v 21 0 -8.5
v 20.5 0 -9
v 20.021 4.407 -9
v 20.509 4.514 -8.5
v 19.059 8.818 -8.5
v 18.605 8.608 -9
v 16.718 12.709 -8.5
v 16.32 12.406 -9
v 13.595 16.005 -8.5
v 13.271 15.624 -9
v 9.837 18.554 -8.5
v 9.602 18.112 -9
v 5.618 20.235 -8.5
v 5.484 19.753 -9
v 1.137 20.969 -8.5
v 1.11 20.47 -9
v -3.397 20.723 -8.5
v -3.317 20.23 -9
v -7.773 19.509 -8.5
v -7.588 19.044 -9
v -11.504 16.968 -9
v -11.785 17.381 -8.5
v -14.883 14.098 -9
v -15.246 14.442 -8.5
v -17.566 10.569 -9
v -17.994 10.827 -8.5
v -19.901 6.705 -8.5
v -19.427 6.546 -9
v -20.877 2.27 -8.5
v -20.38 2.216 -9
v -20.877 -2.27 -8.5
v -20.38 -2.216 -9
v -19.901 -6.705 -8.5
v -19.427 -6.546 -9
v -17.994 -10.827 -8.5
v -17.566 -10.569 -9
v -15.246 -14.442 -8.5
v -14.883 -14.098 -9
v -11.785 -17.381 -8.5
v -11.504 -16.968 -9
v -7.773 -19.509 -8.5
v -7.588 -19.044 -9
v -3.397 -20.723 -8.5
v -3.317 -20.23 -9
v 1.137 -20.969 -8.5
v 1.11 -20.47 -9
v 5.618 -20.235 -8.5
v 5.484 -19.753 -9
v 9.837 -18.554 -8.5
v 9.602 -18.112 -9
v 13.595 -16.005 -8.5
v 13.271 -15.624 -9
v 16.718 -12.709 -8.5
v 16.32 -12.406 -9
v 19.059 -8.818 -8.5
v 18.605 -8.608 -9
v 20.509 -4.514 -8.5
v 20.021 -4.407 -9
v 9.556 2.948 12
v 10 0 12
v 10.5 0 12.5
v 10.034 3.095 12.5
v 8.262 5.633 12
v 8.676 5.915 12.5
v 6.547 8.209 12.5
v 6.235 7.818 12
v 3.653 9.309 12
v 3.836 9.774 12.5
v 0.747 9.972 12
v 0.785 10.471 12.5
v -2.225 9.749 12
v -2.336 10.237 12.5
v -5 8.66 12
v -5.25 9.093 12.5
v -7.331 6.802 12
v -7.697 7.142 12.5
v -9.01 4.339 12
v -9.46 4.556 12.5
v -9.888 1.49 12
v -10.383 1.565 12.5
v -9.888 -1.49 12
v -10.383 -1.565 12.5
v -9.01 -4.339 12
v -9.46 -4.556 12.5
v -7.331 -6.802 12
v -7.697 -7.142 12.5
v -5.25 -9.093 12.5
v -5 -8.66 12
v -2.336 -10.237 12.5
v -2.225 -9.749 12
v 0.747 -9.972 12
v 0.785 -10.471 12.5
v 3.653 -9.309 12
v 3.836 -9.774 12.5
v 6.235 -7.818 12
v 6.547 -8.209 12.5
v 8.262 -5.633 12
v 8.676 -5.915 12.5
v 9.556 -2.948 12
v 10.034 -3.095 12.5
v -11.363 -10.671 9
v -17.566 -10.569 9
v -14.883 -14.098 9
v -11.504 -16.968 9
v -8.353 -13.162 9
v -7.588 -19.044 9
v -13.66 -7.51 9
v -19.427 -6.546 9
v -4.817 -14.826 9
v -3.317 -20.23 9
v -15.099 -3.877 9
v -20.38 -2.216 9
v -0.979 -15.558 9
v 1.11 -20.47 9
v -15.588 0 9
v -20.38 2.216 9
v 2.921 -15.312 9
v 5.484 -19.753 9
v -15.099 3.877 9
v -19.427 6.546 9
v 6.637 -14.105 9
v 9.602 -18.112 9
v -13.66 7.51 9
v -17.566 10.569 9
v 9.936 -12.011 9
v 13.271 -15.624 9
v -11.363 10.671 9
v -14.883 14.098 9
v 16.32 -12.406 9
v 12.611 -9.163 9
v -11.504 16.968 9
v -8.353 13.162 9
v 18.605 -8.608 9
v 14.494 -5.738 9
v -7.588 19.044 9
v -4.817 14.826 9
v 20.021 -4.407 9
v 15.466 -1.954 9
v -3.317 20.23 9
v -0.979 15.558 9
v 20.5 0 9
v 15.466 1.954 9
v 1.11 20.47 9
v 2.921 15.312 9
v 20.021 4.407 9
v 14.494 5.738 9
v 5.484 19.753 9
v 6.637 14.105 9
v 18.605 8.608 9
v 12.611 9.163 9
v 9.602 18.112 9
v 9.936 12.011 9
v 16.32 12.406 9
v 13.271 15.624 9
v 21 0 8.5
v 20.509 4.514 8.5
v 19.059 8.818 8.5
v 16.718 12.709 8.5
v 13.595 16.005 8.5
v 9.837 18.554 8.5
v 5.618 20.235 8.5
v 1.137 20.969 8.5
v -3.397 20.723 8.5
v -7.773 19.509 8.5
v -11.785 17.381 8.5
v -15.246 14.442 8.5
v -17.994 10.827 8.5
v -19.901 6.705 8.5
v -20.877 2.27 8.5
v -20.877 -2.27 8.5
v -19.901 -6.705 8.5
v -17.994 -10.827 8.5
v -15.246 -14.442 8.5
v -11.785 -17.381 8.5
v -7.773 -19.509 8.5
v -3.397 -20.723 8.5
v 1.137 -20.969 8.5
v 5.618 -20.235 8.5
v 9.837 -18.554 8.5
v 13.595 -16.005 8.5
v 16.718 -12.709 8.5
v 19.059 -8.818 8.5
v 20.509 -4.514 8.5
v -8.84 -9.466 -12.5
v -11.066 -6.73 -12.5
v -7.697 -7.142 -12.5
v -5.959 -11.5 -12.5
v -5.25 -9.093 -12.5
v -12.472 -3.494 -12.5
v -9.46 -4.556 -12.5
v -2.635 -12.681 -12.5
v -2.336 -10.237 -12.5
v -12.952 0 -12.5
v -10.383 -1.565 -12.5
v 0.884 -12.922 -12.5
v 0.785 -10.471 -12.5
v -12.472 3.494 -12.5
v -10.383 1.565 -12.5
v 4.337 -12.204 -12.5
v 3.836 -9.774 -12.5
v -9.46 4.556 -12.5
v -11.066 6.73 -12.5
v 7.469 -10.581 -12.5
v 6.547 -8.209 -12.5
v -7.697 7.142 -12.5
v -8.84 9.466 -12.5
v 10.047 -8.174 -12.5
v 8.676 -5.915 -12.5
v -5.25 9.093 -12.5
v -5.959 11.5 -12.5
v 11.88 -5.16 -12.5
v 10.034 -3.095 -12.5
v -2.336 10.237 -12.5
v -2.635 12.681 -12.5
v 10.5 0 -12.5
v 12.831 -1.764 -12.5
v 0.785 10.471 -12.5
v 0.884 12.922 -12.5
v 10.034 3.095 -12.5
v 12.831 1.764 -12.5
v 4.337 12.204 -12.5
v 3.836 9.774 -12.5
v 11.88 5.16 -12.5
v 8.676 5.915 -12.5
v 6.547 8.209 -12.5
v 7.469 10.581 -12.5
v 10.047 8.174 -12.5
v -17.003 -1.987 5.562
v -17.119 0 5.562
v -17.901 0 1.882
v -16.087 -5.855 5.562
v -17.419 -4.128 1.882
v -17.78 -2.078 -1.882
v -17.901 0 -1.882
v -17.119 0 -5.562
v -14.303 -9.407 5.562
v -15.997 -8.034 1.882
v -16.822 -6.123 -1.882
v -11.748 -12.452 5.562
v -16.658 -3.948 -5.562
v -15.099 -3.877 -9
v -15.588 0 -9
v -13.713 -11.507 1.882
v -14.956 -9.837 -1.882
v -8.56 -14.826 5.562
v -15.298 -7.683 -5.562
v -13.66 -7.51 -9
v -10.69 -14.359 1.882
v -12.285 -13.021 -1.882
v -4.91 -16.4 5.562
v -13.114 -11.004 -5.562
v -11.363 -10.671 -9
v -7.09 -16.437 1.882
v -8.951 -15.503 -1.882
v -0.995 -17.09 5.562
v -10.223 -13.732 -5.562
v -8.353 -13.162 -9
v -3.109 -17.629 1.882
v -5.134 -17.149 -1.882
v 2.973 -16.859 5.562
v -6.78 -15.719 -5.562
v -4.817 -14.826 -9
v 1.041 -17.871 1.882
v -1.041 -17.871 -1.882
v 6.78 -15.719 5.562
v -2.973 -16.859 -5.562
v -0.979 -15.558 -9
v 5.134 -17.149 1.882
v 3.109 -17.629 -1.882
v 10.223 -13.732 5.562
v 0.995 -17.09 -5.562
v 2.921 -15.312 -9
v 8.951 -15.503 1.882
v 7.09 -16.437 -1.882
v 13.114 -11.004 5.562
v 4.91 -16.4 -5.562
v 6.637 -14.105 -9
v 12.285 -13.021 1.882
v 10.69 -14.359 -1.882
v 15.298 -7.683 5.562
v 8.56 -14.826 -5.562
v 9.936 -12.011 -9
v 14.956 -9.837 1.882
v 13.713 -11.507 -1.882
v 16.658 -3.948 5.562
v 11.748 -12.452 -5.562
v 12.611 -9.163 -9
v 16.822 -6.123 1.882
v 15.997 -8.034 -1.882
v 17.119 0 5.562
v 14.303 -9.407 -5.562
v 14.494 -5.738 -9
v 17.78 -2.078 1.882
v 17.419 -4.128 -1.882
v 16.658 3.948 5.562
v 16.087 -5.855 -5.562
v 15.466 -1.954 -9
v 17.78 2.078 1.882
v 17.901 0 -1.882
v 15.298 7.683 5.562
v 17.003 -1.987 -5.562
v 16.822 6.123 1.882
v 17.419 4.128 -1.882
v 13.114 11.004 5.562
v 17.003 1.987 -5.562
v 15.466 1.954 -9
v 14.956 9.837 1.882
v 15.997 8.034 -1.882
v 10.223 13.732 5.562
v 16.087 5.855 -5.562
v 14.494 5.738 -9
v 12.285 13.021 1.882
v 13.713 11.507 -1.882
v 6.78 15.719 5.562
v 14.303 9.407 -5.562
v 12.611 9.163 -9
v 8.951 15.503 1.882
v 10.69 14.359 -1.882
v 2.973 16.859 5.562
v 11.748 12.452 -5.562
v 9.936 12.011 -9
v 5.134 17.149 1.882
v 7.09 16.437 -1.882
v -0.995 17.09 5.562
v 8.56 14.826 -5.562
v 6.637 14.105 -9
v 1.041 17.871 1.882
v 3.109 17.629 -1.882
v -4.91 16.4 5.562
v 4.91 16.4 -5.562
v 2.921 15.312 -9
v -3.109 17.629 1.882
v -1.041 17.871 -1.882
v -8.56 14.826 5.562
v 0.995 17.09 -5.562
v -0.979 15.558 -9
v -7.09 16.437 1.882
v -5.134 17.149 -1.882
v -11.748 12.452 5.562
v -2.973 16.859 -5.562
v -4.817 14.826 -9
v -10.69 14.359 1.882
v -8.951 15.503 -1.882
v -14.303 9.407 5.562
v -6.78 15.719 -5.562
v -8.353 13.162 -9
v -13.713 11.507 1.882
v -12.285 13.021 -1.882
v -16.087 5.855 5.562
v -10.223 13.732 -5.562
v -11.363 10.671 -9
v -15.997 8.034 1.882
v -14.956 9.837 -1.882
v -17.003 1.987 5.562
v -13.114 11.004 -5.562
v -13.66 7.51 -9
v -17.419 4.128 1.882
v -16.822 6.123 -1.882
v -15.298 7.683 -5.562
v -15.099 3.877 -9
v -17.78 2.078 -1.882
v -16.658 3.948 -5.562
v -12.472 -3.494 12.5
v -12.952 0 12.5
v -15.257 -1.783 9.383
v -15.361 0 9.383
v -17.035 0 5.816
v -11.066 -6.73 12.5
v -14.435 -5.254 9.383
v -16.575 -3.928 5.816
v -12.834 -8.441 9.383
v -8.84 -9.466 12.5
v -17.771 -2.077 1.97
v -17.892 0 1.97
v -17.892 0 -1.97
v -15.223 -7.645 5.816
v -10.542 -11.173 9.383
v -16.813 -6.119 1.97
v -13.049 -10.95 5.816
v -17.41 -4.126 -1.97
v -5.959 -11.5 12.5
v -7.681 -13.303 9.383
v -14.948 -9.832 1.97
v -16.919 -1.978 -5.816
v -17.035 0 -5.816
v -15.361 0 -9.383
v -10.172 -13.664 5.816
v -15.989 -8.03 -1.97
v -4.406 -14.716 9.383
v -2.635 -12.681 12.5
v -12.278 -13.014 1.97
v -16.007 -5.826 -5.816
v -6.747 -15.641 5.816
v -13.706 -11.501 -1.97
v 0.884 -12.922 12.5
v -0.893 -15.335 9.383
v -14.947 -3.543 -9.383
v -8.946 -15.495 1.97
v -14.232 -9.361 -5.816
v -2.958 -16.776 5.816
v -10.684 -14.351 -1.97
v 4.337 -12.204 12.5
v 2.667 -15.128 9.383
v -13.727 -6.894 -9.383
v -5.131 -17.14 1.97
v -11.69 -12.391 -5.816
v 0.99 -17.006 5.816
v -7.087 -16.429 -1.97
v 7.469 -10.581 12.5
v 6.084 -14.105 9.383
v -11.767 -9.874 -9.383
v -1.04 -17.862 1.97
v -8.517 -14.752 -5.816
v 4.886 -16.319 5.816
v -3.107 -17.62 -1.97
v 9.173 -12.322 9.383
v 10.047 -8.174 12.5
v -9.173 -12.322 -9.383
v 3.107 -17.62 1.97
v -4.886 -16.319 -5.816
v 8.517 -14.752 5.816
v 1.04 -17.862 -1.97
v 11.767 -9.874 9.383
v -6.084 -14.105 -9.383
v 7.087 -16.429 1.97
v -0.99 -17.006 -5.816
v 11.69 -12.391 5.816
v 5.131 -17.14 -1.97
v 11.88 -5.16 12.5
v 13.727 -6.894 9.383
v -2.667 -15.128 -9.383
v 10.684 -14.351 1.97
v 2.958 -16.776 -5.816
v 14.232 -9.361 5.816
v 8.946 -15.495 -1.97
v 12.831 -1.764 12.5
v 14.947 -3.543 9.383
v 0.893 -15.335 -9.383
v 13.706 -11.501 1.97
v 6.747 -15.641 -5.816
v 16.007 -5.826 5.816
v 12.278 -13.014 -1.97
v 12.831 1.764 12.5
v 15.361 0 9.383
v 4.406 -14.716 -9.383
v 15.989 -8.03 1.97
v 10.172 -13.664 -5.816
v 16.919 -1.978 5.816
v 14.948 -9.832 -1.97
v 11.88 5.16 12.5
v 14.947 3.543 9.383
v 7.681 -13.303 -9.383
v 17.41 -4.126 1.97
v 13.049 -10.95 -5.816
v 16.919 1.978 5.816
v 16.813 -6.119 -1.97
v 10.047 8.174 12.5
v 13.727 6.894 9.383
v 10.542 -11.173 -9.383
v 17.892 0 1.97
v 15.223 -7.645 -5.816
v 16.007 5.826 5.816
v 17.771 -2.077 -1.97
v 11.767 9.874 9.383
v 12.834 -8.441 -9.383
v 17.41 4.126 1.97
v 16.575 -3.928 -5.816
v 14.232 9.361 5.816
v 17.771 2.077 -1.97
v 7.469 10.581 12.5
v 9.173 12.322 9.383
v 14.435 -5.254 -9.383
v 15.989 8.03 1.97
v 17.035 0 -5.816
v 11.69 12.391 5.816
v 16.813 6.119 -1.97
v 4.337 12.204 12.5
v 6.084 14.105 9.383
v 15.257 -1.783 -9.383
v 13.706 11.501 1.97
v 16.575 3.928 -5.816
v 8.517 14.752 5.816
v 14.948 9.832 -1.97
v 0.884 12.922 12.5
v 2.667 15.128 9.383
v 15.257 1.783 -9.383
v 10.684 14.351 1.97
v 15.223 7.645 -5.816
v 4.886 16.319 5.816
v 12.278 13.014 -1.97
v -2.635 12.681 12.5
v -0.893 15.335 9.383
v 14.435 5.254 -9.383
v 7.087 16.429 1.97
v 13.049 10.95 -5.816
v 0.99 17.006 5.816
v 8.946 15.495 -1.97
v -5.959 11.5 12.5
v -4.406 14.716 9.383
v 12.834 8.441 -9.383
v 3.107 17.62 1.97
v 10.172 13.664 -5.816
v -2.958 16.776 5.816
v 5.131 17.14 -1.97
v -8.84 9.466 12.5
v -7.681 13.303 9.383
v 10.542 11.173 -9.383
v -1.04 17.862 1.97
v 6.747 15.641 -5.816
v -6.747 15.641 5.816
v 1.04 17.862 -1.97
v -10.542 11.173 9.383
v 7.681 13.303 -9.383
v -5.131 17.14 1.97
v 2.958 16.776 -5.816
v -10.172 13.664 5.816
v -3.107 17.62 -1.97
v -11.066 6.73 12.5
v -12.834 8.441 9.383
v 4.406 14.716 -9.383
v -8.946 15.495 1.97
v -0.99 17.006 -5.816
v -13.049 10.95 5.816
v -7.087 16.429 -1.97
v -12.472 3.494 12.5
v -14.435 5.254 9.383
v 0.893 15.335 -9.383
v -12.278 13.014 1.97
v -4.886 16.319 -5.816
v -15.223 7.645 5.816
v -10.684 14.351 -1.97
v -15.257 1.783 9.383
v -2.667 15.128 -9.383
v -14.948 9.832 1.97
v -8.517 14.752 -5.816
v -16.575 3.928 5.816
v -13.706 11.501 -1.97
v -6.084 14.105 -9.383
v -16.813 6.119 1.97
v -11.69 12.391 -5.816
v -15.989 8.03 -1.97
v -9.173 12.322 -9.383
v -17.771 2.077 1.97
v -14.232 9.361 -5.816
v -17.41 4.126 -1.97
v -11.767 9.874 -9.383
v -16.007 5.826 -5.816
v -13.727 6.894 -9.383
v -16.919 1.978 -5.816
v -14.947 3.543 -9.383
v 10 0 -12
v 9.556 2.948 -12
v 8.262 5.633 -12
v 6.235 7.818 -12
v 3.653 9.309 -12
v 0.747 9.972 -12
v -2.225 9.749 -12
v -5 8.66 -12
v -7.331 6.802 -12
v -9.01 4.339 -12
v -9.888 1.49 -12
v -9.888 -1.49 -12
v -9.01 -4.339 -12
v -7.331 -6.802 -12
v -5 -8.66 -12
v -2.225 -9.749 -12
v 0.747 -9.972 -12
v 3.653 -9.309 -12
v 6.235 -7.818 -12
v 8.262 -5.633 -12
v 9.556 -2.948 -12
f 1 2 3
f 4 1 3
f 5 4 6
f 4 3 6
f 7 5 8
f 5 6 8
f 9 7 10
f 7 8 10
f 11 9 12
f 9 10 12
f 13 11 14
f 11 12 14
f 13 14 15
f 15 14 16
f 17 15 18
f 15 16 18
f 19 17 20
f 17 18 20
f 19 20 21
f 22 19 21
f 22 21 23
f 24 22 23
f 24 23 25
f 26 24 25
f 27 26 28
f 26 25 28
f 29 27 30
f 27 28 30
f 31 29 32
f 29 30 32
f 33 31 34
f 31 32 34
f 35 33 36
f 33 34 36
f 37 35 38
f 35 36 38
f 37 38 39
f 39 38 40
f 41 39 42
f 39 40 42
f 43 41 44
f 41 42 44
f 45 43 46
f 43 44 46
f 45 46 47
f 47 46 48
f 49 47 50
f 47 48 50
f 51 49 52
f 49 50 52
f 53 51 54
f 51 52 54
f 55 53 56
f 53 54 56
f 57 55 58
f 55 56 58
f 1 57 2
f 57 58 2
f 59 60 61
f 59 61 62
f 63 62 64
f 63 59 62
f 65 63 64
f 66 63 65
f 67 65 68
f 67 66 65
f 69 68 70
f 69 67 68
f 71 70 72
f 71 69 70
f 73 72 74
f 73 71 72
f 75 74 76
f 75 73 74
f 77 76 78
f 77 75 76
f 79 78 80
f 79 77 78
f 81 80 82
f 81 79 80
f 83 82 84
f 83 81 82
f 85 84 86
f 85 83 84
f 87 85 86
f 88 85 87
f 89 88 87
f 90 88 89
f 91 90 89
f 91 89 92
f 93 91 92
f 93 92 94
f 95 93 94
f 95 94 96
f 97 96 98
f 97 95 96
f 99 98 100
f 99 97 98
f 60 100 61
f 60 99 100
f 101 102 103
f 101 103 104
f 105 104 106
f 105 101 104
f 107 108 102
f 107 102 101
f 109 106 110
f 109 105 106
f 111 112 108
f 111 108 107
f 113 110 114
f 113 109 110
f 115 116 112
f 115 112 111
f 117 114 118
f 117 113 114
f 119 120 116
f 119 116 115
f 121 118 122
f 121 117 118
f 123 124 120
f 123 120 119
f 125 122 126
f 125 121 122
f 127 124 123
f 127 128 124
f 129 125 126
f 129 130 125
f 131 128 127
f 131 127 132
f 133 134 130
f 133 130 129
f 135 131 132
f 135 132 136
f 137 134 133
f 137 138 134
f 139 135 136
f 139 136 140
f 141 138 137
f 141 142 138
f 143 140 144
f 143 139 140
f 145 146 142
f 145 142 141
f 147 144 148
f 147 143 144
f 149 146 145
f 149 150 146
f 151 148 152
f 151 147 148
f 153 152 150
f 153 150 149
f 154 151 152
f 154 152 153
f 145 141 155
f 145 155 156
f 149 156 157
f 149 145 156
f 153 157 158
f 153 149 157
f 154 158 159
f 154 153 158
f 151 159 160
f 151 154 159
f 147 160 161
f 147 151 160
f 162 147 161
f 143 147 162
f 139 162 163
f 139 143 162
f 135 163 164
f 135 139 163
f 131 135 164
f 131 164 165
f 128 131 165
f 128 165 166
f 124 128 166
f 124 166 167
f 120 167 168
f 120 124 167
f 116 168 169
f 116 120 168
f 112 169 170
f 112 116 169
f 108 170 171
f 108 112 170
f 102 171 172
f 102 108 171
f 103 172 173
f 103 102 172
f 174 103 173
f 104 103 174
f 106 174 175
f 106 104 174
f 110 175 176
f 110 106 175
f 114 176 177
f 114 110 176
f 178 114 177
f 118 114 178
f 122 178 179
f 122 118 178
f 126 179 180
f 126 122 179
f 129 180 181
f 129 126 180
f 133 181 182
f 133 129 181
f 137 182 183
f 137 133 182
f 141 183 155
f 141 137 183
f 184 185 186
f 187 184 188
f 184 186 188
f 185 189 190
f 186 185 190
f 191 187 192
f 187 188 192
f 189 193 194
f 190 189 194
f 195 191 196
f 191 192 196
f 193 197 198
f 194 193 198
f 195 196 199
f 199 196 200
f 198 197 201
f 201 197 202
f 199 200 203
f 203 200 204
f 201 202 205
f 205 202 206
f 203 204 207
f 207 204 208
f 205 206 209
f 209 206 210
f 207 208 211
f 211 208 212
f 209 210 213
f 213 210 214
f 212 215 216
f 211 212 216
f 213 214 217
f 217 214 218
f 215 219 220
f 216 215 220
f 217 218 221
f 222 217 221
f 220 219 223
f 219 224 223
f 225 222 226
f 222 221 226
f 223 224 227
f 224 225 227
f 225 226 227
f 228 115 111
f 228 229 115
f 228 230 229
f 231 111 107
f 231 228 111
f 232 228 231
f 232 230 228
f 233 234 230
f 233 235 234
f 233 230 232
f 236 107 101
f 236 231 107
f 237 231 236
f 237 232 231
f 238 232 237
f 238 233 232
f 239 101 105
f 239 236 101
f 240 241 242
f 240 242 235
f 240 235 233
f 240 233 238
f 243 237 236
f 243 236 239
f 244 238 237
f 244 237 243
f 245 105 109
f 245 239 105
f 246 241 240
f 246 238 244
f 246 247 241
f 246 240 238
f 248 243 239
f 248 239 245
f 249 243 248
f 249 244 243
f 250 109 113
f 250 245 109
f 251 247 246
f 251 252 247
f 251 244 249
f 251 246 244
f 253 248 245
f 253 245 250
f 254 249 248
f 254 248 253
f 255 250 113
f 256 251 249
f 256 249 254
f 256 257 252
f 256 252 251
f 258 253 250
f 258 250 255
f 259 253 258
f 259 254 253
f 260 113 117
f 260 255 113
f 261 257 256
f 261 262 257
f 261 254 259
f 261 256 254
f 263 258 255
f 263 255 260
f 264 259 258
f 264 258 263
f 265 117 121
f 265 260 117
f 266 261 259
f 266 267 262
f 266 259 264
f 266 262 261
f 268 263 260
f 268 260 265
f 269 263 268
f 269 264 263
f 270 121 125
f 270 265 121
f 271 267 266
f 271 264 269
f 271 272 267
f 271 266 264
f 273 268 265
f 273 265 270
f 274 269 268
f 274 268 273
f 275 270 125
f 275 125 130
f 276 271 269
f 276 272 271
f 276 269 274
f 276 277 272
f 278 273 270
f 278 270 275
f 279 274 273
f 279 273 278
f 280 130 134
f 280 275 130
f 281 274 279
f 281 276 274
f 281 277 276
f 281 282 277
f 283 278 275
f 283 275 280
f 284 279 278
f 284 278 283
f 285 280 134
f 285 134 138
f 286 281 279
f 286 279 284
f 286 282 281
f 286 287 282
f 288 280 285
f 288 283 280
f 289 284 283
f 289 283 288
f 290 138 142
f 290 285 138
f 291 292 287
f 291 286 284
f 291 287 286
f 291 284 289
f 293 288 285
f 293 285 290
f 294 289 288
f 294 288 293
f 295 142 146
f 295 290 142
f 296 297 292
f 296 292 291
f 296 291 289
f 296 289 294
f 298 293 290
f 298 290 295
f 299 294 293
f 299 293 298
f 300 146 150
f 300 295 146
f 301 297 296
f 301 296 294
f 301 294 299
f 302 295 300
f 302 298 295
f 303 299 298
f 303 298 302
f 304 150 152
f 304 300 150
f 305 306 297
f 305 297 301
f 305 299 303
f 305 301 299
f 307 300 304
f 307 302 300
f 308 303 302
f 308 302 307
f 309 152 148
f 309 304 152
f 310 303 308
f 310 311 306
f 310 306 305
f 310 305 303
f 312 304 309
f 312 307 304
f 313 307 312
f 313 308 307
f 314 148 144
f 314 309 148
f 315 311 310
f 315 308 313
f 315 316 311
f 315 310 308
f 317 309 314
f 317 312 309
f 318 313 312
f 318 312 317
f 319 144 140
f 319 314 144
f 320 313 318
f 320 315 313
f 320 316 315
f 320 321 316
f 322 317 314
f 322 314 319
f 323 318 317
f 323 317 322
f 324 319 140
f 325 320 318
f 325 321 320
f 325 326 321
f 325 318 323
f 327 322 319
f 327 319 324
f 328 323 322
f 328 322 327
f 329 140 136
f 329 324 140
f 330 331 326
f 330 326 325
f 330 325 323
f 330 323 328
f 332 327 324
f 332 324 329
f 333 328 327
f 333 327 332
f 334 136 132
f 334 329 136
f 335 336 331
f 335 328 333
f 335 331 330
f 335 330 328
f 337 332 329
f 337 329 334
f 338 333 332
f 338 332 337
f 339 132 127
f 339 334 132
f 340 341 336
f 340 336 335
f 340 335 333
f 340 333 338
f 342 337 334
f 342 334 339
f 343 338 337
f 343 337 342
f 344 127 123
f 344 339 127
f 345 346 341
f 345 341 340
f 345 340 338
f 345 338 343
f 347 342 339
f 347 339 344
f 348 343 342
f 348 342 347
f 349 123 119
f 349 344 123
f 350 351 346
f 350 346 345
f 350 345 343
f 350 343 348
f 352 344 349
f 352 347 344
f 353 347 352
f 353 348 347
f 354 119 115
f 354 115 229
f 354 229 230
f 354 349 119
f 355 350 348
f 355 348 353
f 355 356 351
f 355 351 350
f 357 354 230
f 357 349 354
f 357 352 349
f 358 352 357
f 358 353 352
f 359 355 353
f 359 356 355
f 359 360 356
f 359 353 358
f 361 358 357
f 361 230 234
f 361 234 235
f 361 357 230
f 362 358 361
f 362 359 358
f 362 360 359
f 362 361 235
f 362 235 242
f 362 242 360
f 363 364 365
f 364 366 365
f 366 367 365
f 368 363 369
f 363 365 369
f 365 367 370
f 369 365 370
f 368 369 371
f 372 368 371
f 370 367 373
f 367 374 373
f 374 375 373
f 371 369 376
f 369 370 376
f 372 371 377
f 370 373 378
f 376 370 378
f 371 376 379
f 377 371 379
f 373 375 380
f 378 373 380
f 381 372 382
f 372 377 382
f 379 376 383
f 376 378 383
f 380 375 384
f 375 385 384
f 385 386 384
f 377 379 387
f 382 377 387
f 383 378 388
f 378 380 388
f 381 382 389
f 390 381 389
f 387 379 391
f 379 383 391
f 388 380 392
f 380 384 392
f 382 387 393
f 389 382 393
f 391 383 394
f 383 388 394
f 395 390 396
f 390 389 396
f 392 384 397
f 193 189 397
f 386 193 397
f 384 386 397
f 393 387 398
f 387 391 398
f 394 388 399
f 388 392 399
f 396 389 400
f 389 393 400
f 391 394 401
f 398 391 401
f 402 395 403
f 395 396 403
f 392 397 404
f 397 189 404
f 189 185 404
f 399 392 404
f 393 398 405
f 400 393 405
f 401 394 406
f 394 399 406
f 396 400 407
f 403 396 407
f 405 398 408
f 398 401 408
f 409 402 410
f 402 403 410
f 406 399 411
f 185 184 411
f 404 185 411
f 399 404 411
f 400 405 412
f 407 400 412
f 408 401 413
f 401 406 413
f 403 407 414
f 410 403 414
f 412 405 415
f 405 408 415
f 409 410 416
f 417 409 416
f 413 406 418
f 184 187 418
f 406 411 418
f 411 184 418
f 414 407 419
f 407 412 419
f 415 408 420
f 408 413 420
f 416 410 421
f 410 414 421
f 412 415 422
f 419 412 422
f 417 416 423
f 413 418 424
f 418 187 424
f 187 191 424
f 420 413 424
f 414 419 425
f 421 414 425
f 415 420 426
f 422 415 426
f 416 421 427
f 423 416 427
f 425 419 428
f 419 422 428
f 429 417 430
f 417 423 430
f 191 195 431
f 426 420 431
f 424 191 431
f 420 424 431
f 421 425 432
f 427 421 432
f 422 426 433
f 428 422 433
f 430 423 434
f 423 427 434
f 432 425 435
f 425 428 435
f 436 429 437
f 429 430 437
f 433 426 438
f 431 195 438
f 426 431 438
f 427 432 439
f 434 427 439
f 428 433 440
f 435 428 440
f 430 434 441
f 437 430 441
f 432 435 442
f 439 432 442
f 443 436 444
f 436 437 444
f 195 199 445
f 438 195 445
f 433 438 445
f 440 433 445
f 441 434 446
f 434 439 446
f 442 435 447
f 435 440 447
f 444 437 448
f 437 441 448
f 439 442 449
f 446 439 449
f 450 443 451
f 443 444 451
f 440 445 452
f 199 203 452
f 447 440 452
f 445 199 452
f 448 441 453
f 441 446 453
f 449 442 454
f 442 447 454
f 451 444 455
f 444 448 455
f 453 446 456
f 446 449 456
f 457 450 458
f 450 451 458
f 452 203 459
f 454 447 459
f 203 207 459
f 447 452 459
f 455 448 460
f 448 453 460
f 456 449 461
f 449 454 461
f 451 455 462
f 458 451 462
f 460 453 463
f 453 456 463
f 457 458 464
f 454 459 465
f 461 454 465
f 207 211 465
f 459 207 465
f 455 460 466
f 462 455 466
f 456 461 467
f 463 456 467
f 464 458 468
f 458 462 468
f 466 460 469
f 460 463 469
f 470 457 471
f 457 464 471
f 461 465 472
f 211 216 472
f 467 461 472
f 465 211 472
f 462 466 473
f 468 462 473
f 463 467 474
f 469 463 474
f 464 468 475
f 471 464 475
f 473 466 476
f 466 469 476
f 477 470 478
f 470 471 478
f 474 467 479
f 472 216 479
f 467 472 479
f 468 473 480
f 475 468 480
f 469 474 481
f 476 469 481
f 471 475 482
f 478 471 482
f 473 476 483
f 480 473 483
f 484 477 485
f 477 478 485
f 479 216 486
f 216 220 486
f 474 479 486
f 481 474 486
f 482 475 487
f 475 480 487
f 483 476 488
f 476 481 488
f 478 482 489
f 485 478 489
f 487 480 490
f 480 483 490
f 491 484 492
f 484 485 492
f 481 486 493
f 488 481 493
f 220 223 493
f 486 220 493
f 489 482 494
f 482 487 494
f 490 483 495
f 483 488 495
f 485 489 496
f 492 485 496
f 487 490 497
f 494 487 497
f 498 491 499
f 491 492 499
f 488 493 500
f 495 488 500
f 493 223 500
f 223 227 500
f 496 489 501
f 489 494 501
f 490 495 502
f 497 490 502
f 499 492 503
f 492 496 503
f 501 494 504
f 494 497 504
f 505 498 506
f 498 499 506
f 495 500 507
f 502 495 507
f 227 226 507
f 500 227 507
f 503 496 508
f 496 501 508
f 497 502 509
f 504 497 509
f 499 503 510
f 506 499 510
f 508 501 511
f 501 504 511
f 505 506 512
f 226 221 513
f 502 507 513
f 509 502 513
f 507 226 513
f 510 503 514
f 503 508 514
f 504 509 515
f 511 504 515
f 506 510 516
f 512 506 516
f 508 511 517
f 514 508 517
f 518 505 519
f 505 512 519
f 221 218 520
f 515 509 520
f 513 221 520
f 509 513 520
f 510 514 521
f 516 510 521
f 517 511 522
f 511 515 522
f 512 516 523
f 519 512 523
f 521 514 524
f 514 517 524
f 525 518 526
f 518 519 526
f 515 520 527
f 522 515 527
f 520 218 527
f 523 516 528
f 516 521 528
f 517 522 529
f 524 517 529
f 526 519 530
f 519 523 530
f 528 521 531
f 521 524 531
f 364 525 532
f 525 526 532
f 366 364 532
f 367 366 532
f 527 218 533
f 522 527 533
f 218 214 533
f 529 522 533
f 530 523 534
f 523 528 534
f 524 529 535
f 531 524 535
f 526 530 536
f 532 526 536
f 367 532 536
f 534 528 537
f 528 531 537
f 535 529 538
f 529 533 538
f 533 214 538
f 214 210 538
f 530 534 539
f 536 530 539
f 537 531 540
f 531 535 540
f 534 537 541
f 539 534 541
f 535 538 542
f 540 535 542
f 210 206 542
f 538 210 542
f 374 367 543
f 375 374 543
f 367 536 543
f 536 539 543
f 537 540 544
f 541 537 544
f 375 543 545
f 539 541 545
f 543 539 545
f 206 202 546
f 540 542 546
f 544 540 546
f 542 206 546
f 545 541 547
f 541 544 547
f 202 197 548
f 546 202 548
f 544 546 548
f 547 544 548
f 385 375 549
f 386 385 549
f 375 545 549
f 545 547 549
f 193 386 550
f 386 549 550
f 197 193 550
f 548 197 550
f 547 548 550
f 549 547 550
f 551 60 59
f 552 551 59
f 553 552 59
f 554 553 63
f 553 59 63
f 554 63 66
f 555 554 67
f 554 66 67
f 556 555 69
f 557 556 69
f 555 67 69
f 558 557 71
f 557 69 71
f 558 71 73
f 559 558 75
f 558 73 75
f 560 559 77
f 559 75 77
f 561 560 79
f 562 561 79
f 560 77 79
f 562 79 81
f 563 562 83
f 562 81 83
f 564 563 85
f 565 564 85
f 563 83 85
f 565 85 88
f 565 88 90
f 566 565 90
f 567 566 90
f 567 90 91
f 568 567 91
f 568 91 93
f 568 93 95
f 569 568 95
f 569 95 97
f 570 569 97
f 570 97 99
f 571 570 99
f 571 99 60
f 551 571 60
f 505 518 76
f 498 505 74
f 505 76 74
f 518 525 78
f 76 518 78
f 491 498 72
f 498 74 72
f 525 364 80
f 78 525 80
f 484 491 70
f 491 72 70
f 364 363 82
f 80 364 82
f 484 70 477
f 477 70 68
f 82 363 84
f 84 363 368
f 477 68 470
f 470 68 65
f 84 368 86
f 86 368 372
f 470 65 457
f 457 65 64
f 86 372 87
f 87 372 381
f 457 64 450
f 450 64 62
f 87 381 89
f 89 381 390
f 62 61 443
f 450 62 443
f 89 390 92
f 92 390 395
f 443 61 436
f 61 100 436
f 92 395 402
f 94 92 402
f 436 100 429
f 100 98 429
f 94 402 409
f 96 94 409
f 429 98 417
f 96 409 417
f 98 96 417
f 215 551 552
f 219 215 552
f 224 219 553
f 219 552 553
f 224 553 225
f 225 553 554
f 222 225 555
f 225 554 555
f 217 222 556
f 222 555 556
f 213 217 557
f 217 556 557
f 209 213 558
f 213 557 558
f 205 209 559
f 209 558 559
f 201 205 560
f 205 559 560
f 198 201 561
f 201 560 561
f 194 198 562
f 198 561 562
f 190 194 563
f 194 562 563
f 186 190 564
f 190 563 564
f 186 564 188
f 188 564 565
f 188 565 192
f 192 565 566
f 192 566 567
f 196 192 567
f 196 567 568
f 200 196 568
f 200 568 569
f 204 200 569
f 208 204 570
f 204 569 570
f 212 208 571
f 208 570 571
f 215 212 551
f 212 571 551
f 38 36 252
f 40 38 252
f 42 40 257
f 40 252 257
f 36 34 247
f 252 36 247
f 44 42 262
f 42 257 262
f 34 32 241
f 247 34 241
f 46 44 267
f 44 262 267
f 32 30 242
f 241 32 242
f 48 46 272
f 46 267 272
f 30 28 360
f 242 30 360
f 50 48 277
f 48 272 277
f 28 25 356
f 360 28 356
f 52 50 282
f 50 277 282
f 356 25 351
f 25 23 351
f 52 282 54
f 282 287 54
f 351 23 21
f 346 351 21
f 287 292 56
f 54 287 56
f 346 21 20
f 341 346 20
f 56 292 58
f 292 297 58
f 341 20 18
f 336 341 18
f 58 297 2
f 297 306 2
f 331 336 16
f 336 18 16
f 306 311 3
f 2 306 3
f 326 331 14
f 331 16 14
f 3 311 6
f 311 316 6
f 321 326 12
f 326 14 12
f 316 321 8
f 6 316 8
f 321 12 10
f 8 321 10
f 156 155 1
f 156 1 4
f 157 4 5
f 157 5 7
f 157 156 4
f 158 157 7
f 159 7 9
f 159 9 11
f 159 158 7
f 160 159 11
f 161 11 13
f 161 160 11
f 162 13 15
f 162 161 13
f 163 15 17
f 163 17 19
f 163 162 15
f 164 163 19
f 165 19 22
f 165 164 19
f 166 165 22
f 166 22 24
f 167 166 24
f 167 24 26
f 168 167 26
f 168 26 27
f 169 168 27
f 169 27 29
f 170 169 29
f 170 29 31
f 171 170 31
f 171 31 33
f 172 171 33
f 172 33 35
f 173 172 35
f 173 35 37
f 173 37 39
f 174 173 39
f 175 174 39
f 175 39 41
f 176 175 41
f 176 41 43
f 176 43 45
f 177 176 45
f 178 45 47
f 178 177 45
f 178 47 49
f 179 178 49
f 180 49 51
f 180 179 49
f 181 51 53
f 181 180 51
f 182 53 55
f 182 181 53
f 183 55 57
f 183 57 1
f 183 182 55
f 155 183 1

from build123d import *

# Parameters (mm, degrees)
F0_R          = 21
F1_DEPTH      = 9
F5_W          = 69.3683687429
F5_H          = 36.7891268256
F5_W_2        = 82.6124584142
F5_H_2        = 24.5260778603
F6_DEPTH      = 21.001
F6_DEPTH_BACK = 21.001
F7_R          = 10
F8_DEPTH      = 25.001
F9_SIZE       = 0.5
F9_2_SIZE     = 0.5


with BuildPart() as f1:
    # F0 (on Top) → F1 (new body, symmetric)
    with BuildSketch(Plane.XY):
        Circle(F0_R)
    extrude(amount=F1_DEPTH, both=True)

    # F2 (on Front) → F3 (revolve, cut)
    with BuildSketch(Plane.XZ):
        with BuildLine():
            Line((0, -18), (0, 18))
            ThreePointArc((0, 18), (-18, 0), (0, -18))
        make_face()
    revolve(axis=Axis((0, 0, 0.9149120826), (0, 0, 1)), mode=Mode.SUBTRACT)

    # F9
    f9_edges = [f1.edges().sort_by_distance(p)[0] for p in [
        (-21, 0, 9),
        (-21, 0, -9),
    ]]
    chamfer(f9_edges, length=F9_SIZE)


with BuildPart() as f4:
    # F2 (on Front) → F4 (revolve)
    with BuildSketch(Plane.XZ):
        with BuildLine():
            Line((0, -18), (0, 18))
            ThreePointArc((0, 18), (-18, 0), (0, -18))
        make_face()
    revolve(axis=Axis((0, 0, 0.9149120826), (0, 0, 1)))

    # F5 (on Front) → F6 (cut, two sides)
    with BuildSketch(Plane.XZ) as f6_sk:
        with Locations((0, 30.8945634128)):
            Rectangle(F5_W, F5_H)
        with Locations((0, -24.7630389301)):
            Rectangle(F5_W_2, F5_H_2)
    extrude(amount=-F6_DEPTH, mode=Mode.SUBTRACT)
    extrude(f6_sk.sketch, amount=F6_DEPTH_BACK, mode=Mode.SUBTRACT)

    # F7 (on face) → F8 (cut, through all)
    with BuildSketch(Plane.XY.offset(12.5)):
        Circle(F7_R)
    extrude(amount=-F8_DEPTH, mode=Mode.SUBTRACT)

    # F9#2
    f9_2_edges = [f4.edges().sort_by_distance(p)[0] for p in [
        (-10, 0, 12.5),
        (10, 0, 0),
        (-10, 0, -12.5),
    ]]
    chamfer(f9_2_edges, length=F9_2_SIZE)


solid = Compound([f1.part, f4.part])
